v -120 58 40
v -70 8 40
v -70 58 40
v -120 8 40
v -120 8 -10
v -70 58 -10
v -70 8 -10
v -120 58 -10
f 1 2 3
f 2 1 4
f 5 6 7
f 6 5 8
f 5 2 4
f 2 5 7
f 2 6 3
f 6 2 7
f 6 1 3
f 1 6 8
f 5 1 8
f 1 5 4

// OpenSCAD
intersection() {
    translate([-120, 8, -10]) {
        cube (50, 40, 20);
    }
}
